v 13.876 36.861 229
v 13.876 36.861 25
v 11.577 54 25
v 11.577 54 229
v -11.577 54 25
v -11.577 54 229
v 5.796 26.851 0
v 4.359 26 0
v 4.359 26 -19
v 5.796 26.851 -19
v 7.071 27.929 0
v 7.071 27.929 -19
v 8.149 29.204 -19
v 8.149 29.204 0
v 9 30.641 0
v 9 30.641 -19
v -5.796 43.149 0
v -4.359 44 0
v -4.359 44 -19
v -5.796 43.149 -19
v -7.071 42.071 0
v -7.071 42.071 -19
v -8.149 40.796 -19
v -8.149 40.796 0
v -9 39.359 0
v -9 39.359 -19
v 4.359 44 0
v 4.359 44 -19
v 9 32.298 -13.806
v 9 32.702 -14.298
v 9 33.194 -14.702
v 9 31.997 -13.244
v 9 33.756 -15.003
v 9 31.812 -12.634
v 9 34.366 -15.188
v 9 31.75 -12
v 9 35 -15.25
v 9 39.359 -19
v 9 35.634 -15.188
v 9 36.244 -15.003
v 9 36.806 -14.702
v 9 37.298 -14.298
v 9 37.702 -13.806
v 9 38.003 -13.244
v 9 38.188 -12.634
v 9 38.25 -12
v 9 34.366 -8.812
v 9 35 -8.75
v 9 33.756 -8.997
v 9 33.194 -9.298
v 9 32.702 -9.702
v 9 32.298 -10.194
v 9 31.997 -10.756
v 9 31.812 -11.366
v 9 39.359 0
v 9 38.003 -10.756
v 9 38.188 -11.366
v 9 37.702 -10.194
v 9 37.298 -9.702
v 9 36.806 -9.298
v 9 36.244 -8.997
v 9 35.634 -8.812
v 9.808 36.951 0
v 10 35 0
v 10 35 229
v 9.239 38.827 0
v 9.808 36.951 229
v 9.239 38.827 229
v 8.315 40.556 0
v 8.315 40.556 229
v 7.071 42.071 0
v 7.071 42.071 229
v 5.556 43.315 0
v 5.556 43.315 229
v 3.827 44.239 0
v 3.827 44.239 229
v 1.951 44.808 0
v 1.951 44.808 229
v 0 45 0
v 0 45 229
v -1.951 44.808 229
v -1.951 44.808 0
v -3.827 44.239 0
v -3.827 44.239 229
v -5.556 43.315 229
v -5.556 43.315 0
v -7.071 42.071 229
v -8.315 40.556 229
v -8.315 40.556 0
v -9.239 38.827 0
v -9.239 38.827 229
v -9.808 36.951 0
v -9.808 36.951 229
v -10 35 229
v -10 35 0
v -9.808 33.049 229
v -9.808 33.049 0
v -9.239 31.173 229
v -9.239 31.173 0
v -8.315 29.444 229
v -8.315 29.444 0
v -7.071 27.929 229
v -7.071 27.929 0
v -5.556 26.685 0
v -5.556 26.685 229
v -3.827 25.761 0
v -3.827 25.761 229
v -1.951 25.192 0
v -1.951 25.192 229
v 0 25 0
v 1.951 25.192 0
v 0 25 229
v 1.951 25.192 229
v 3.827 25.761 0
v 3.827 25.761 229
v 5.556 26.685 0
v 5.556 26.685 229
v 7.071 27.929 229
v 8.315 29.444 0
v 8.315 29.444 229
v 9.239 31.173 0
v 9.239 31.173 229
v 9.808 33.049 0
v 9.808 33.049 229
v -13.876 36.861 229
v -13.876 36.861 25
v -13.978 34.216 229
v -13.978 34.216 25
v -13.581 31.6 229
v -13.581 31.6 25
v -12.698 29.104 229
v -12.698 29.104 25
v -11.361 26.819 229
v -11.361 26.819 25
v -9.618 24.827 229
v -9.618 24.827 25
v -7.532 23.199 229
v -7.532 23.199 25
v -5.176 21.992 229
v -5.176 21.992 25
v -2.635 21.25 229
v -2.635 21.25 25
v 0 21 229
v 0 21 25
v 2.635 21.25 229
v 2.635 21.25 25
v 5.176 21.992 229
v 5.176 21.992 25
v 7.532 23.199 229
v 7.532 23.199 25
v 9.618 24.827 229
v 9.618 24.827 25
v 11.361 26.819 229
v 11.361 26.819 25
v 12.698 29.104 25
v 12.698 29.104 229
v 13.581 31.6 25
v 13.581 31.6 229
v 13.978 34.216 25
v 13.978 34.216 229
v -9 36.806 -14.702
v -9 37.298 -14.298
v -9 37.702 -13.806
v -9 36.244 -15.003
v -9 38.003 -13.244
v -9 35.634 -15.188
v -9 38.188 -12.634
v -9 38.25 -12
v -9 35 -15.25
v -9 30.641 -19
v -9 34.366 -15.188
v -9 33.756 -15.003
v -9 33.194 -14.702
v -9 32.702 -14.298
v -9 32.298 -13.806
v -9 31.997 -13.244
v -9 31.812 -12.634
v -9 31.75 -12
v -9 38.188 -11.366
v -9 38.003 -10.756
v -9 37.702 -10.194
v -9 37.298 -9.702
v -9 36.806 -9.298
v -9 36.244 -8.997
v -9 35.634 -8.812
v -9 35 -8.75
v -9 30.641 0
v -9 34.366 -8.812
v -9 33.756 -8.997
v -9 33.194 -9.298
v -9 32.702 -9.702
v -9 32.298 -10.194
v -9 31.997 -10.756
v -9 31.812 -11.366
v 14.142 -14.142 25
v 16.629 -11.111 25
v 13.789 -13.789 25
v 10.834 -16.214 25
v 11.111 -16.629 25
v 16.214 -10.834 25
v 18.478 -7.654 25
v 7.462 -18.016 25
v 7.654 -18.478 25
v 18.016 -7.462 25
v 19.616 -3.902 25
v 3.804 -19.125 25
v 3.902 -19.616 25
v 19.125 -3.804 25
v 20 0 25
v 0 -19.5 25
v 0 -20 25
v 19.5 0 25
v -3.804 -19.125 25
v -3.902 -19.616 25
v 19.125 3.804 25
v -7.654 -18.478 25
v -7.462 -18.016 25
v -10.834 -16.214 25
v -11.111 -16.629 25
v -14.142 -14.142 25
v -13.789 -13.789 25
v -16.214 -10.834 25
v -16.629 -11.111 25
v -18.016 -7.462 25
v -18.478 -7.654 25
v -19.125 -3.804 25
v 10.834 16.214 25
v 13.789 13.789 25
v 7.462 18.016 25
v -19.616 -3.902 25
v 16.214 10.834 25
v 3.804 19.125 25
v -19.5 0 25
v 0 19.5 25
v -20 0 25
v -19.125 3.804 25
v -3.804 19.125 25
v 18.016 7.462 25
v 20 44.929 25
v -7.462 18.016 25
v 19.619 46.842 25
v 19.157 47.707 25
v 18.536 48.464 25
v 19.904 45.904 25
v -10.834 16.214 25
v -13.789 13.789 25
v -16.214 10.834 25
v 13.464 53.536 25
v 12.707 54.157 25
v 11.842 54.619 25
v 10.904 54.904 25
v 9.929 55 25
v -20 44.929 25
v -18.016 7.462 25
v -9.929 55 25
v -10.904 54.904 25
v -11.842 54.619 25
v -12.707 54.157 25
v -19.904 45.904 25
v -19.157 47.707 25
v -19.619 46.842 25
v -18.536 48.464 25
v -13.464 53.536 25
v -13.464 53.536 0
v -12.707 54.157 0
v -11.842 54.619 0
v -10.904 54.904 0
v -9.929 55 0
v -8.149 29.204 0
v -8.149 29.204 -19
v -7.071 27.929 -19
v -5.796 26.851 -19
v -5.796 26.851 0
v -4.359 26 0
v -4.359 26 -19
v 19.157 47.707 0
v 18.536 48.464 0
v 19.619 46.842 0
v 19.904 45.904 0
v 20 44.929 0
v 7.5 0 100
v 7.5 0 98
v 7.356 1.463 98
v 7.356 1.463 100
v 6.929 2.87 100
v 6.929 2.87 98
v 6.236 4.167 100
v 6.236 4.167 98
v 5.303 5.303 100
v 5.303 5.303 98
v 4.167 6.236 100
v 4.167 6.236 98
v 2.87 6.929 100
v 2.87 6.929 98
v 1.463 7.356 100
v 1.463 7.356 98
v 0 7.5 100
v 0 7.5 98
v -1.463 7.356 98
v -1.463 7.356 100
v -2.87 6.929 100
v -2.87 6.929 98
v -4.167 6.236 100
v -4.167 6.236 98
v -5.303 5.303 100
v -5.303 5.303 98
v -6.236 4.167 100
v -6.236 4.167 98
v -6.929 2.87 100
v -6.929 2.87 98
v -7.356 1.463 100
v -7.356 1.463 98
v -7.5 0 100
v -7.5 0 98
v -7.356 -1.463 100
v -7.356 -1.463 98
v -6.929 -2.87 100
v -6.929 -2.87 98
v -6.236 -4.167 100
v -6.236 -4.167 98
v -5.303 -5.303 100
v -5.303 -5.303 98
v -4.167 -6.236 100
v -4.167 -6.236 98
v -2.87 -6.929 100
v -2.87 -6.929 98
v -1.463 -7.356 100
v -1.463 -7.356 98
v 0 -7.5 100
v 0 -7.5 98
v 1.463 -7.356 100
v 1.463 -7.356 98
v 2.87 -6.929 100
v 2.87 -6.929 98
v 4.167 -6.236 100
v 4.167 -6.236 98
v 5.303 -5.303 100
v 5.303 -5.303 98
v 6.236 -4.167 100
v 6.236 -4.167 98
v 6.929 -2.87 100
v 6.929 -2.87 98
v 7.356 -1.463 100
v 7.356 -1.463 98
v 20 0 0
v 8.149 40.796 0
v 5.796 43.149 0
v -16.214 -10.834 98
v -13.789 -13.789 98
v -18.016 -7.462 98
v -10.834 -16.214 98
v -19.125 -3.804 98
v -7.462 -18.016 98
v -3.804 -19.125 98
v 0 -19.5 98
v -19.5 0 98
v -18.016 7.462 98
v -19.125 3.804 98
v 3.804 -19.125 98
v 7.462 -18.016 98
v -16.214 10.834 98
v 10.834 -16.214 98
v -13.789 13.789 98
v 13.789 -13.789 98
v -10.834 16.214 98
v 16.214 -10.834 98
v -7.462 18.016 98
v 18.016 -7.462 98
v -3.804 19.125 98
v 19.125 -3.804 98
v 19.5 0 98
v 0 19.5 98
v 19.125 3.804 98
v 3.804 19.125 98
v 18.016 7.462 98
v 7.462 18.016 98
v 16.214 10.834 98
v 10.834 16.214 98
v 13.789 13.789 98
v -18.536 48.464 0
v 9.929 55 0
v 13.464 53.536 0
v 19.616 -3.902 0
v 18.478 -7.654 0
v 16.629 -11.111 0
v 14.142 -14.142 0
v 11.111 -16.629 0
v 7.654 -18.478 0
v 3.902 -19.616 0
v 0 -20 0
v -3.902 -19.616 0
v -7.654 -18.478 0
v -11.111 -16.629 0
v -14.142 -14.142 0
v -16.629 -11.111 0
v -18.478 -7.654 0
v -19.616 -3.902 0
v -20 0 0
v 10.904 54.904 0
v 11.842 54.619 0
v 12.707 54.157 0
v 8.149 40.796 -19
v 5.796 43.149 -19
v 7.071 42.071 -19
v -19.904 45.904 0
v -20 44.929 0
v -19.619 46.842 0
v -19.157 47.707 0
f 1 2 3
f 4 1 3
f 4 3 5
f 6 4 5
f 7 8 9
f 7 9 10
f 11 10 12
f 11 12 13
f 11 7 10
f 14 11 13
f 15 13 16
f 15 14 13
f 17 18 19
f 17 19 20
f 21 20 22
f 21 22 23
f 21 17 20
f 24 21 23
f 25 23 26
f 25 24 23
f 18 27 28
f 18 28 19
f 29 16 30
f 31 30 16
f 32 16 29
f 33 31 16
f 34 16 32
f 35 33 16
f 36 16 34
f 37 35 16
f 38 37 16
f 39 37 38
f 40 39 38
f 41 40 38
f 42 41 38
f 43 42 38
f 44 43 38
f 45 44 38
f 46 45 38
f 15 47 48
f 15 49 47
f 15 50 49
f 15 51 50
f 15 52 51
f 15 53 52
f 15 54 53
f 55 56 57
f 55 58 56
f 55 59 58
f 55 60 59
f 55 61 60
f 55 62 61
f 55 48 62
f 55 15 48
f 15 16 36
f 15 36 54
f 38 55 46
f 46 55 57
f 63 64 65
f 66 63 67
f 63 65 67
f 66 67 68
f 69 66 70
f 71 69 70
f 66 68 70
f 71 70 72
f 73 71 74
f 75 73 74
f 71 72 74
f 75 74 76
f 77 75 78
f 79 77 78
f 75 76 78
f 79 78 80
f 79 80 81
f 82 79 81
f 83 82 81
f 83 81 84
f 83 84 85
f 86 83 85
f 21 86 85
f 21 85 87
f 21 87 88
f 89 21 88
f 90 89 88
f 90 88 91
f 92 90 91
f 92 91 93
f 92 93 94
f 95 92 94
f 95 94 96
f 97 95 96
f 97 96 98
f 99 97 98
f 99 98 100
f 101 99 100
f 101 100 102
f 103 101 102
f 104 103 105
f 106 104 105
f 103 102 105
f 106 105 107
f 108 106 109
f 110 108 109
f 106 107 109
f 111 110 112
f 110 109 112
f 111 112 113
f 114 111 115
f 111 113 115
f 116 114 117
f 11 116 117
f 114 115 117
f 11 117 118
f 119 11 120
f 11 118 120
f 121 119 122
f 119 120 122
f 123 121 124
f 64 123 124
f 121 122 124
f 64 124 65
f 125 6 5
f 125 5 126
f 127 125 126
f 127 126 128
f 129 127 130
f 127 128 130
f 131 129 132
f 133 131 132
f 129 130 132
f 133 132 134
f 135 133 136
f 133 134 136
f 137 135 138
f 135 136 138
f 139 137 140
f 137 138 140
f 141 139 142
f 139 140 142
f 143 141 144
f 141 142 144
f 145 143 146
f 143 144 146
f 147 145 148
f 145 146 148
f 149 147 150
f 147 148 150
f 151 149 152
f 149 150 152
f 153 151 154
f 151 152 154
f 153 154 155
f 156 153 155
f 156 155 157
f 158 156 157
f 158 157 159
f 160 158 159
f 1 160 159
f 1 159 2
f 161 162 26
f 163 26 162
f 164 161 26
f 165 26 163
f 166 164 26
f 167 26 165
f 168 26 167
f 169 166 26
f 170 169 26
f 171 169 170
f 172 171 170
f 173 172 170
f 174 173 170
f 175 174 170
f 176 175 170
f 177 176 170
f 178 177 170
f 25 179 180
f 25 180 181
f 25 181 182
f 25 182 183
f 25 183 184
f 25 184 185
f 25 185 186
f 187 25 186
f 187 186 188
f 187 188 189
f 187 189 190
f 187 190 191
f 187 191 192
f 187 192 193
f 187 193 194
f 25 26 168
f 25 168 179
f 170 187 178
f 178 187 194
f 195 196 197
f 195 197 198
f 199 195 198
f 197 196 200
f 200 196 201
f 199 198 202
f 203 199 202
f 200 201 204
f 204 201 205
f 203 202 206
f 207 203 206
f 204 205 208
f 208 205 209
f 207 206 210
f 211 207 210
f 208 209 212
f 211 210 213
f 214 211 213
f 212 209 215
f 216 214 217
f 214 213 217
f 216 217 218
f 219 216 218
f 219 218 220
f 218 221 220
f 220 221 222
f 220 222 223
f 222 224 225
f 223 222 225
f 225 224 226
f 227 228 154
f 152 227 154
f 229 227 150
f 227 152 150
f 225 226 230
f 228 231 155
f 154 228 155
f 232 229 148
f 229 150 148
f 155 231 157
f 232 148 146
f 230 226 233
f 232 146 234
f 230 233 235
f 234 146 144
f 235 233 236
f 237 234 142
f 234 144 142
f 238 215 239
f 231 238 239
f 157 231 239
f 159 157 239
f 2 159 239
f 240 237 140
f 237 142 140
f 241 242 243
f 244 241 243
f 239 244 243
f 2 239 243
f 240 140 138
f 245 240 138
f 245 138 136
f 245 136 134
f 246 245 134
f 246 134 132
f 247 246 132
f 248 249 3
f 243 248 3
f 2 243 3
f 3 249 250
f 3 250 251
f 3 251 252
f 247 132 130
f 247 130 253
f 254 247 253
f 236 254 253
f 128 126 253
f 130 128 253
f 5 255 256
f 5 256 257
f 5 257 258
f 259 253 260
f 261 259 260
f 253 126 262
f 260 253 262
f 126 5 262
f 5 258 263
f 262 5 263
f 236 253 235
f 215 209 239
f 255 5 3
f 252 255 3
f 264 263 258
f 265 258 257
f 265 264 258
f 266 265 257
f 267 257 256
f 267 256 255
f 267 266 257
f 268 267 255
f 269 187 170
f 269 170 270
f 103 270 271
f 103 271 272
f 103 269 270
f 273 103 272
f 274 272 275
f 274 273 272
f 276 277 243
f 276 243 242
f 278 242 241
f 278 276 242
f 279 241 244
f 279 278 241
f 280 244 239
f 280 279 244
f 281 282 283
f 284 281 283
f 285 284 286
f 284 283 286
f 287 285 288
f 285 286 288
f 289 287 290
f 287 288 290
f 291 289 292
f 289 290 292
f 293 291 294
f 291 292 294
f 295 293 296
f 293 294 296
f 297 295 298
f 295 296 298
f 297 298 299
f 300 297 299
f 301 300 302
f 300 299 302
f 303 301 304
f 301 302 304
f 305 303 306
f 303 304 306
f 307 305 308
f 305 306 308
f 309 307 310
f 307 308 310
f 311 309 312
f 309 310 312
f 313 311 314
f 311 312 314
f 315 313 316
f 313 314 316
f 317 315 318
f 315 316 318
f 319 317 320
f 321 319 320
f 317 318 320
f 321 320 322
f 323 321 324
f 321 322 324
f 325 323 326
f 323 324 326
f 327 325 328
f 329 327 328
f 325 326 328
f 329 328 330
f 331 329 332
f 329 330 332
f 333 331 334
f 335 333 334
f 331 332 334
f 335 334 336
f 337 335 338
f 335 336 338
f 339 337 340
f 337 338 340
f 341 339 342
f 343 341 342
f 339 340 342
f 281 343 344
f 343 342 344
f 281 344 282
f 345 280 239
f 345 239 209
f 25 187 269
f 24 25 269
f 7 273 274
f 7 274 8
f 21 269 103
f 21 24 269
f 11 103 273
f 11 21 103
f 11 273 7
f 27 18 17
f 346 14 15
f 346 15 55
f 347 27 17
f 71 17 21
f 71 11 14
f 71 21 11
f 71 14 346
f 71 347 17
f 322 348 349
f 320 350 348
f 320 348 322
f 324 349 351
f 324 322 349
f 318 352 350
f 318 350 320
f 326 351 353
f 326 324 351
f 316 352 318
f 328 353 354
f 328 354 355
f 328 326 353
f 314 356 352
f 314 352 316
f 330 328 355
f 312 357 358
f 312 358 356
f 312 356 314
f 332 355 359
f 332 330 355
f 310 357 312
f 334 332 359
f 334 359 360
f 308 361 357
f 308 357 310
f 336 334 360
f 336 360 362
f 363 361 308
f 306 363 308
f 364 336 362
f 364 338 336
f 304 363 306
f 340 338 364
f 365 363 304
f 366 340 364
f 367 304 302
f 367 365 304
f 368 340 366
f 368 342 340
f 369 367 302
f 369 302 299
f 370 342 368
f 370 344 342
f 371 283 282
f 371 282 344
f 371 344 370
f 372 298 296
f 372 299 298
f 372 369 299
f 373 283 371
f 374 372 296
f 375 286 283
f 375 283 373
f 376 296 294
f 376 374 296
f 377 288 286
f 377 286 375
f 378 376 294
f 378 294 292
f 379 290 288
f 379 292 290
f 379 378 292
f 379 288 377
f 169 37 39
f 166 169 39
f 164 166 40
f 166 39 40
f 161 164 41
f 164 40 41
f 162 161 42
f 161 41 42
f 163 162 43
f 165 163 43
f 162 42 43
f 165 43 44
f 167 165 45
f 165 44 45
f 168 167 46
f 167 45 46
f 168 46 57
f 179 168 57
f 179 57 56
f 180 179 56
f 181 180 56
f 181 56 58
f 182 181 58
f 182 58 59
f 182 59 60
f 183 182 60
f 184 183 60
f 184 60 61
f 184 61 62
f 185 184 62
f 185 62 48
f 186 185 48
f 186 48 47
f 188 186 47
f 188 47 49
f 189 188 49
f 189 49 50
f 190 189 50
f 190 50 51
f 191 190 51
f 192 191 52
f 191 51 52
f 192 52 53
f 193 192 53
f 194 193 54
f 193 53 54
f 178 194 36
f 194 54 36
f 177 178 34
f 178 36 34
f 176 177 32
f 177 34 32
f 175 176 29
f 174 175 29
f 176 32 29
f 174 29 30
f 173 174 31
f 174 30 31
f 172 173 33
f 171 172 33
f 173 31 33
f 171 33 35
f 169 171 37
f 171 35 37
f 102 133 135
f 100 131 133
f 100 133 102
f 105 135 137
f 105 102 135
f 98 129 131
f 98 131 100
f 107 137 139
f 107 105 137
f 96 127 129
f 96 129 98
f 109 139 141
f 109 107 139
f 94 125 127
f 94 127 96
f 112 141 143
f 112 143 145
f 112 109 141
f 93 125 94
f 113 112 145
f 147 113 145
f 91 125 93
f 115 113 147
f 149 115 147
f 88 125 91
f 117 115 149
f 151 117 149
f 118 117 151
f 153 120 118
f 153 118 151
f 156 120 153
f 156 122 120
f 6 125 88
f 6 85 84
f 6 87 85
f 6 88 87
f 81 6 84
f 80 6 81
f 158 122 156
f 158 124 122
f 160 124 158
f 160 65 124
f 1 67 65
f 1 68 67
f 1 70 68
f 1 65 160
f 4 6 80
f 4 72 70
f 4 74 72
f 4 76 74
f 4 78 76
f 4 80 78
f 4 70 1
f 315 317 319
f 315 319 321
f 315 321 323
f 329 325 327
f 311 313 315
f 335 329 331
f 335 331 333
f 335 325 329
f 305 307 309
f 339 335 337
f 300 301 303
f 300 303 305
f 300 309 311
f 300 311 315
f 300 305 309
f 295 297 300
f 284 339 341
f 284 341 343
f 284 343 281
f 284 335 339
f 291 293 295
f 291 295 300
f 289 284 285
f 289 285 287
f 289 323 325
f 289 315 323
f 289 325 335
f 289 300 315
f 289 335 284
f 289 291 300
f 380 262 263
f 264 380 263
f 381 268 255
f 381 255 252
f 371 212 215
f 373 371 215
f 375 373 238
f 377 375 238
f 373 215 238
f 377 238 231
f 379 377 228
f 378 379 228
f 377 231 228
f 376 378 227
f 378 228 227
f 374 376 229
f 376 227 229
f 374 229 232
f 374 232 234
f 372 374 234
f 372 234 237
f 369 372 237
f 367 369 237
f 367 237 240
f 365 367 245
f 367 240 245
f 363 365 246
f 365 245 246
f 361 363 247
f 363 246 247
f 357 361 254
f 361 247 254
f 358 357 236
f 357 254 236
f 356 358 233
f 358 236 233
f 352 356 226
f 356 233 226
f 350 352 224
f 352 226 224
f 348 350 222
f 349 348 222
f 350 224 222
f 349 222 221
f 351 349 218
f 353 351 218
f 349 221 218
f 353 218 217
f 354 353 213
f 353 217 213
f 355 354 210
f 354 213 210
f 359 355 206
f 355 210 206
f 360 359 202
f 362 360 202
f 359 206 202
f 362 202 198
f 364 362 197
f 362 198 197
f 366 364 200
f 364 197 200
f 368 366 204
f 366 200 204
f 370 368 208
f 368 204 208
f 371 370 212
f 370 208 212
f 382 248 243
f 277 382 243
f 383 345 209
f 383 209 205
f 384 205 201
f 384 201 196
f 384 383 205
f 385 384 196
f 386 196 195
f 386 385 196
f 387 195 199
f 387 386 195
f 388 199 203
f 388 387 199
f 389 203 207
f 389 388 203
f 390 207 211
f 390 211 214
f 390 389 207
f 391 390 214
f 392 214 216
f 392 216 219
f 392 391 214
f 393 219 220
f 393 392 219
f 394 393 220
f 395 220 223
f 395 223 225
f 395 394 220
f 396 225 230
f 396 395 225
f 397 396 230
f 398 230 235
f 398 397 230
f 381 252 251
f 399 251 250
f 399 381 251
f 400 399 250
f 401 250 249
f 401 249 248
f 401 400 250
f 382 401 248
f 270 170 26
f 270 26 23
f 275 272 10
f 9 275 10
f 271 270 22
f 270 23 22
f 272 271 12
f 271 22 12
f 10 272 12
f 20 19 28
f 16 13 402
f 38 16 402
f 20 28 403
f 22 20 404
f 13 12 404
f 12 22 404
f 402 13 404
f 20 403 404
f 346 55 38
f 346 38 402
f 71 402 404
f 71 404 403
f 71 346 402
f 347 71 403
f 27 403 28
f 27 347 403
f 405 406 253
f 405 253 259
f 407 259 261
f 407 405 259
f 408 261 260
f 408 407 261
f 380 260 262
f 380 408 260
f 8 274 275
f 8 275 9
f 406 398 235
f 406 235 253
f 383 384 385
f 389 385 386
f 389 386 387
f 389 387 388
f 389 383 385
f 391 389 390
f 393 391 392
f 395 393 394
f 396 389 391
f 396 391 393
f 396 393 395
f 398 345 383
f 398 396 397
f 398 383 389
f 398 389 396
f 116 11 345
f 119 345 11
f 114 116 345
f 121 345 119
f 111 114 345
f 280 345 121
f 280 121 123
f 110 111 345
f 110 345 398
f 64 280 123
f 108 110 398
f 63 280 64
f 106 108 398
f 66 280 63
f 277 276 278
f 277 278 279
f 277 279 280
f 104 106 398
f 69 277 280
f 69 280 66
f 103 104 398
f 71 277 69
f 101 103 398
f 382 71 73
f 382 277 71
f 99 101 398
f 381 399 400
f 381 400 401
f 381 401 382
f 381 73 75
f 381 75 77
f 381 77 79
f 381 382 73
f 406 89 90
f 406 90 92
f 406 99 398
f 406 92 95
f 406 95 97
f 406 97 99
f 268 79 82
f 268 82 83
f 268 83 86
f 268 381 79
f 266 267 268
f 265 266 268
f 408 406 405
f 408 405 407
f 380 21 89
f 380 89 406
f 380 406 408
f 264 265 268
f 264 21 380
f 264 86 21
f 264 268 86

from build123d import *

# Parameters (mm, degrees)
EXTRUDE_1_DEPTH     = 25
SKETCH_2_R          = 19.5
EXTRUDE_2_DEPTH     = 73
SKETCH_3_R          = 7.5
EXTRUDE_3_DEPTH     = 2
EXTRUDE_4_DEPTH     = 204
SKETCH_5_R          = 10
CUT_EXTRUDE_1_DEPTH = 410
EXTRUDE_5_DEPTH     = 19
SKETCH_7_R          = 3.25
CUT_EXTRUDE_2_DEPTH = 20


with BuildPart() as part:
    # 草图1 → 凸台-拉伸1 (new body)
    with BuildSketch(Plane.XY):
        with BuildLine():
            Line((-20, 0), (-20, 44.928932188))
            ThreePointArc((-20, 44.928932188), (-19.619397663, 46.84234935), (-18.535533906, 48.464466094))
            Line((-18.535533906, 48.464466094), (-13.464466094, 53.535533906))
            ThreePointArc((-13.464466094, 53.535533906), (-11.84234935, 54.619397663), (-9.928932188, 55))
            Line((-9.928932188, 55), (9.928932188, 55))
            ThreePointArc((9.928932188, 55), (11.84234935, 54.619397663), (13.464466094, 53.535533906))
            Line((13.464466094, 53.535533906), (18.535533906, 48.464466094))
            ThreePointArc((18.535533906, 48.464466094), (19.619397663, 46.84234935), (20, 44.928932188))
            Line((20, 44.928932188), (20, 0))
            ThreePointArc((20, 0), (0, -20), (-20, 0))
        make_face()
    extrude(amount=EXTRUDE_1_DEPTH)

    # 草图2 → 凸台-拉伸2 (add)
    with BuildSketch(Plane.XY.offset(25)):
        Circle(SKETCH_2_R)
    extrude(amount=EXTRUDE_2_DEPTH)

    # 草图3 → 凸台-拉伸3 (add)
    with BuildSketch(Plane.XY.offset(98)):
        Circle(SKETCH_3_R)
    extrude(amount=EXTRUDE_3_DEPTH)

    # 草图4 → 凸台-拉伸4 (add)
    with BuildSketch(Plane.XY.offset(25)):
        with BuildLine():
            Line((-11.576521962, 54), (-13.87569737, 36.861457087))
            ThreePointArc((-13.87569737, 36.861457087), (0, 21), (13.87569737, 36.861457087))
            Line((13.87569737, 36.861457087), (11.576521962, 54))
            Line((11.576521962, 54), (-11.576521962, 54))
        make_face()
    extrude(amount=EXTRUDE_4_DEPTH)

    # 草图5 → 切除-拉伸1 (cut)
    with BuildSketch(Plane.XY.offset(229)):
        with Locations((0, 35)):
            Circle(SKETCH_5_R)
    extrude(amount=-CUT_EXTRUDE_1_DEPTH, mode=Mode.SUBTRACT)


with BuildPart() as body_2:
    # 草图6 → 凸台-拉伸5 (new body)
    with BuildSketch(Plane(origin=(0, 0, 0), x_dir=(-1, 0, 0), z_dir=(0, 0, -1))):
        with BuildLine():
            Line((-4.358898944, 44), (4.358898944, 44))
            ThreePointArc((4.358898944, 44), (7.071067812, 42.071067812), (9, 39.358898944))
            Line((9, 39.358898944), (9, 30.641101056))
            ThreePointArc((9, 30.641101056), (7.071067812, 27.928932188), (4.358898944, 26))
            Line((4.358898944, 26), (-4.358898944, 26))
            ThreePointArc((-4.358898944, 26), (-7.071067812, 27.928932188), (-9, 30.641101056))
            Line((-9, 30.641101056), (-9, 39.358898944))
            ThreePointArc((-9, 39.358898944), (-7.071067812, 42.071067812), (-4.358898944, 44))
        make_face()
    extrude(amount=EXTRUDE_5_DEPTH)

    # 草图7 → 切除-拉伸2 (cut)
    with BuildSketch(Plane(origin=(9, 0, 0), x_dir=(0, 0, -1), z_dir=(1, 0, 0))):
        with Locations((12, 35)):
            Circle(SKETCH_7_R)
    extrude(amount=-CUT_EXTRUDE_2_DEPTH, mode=Mode.SUBTRACT)


solid = Compound([part.part, body_2.part])
